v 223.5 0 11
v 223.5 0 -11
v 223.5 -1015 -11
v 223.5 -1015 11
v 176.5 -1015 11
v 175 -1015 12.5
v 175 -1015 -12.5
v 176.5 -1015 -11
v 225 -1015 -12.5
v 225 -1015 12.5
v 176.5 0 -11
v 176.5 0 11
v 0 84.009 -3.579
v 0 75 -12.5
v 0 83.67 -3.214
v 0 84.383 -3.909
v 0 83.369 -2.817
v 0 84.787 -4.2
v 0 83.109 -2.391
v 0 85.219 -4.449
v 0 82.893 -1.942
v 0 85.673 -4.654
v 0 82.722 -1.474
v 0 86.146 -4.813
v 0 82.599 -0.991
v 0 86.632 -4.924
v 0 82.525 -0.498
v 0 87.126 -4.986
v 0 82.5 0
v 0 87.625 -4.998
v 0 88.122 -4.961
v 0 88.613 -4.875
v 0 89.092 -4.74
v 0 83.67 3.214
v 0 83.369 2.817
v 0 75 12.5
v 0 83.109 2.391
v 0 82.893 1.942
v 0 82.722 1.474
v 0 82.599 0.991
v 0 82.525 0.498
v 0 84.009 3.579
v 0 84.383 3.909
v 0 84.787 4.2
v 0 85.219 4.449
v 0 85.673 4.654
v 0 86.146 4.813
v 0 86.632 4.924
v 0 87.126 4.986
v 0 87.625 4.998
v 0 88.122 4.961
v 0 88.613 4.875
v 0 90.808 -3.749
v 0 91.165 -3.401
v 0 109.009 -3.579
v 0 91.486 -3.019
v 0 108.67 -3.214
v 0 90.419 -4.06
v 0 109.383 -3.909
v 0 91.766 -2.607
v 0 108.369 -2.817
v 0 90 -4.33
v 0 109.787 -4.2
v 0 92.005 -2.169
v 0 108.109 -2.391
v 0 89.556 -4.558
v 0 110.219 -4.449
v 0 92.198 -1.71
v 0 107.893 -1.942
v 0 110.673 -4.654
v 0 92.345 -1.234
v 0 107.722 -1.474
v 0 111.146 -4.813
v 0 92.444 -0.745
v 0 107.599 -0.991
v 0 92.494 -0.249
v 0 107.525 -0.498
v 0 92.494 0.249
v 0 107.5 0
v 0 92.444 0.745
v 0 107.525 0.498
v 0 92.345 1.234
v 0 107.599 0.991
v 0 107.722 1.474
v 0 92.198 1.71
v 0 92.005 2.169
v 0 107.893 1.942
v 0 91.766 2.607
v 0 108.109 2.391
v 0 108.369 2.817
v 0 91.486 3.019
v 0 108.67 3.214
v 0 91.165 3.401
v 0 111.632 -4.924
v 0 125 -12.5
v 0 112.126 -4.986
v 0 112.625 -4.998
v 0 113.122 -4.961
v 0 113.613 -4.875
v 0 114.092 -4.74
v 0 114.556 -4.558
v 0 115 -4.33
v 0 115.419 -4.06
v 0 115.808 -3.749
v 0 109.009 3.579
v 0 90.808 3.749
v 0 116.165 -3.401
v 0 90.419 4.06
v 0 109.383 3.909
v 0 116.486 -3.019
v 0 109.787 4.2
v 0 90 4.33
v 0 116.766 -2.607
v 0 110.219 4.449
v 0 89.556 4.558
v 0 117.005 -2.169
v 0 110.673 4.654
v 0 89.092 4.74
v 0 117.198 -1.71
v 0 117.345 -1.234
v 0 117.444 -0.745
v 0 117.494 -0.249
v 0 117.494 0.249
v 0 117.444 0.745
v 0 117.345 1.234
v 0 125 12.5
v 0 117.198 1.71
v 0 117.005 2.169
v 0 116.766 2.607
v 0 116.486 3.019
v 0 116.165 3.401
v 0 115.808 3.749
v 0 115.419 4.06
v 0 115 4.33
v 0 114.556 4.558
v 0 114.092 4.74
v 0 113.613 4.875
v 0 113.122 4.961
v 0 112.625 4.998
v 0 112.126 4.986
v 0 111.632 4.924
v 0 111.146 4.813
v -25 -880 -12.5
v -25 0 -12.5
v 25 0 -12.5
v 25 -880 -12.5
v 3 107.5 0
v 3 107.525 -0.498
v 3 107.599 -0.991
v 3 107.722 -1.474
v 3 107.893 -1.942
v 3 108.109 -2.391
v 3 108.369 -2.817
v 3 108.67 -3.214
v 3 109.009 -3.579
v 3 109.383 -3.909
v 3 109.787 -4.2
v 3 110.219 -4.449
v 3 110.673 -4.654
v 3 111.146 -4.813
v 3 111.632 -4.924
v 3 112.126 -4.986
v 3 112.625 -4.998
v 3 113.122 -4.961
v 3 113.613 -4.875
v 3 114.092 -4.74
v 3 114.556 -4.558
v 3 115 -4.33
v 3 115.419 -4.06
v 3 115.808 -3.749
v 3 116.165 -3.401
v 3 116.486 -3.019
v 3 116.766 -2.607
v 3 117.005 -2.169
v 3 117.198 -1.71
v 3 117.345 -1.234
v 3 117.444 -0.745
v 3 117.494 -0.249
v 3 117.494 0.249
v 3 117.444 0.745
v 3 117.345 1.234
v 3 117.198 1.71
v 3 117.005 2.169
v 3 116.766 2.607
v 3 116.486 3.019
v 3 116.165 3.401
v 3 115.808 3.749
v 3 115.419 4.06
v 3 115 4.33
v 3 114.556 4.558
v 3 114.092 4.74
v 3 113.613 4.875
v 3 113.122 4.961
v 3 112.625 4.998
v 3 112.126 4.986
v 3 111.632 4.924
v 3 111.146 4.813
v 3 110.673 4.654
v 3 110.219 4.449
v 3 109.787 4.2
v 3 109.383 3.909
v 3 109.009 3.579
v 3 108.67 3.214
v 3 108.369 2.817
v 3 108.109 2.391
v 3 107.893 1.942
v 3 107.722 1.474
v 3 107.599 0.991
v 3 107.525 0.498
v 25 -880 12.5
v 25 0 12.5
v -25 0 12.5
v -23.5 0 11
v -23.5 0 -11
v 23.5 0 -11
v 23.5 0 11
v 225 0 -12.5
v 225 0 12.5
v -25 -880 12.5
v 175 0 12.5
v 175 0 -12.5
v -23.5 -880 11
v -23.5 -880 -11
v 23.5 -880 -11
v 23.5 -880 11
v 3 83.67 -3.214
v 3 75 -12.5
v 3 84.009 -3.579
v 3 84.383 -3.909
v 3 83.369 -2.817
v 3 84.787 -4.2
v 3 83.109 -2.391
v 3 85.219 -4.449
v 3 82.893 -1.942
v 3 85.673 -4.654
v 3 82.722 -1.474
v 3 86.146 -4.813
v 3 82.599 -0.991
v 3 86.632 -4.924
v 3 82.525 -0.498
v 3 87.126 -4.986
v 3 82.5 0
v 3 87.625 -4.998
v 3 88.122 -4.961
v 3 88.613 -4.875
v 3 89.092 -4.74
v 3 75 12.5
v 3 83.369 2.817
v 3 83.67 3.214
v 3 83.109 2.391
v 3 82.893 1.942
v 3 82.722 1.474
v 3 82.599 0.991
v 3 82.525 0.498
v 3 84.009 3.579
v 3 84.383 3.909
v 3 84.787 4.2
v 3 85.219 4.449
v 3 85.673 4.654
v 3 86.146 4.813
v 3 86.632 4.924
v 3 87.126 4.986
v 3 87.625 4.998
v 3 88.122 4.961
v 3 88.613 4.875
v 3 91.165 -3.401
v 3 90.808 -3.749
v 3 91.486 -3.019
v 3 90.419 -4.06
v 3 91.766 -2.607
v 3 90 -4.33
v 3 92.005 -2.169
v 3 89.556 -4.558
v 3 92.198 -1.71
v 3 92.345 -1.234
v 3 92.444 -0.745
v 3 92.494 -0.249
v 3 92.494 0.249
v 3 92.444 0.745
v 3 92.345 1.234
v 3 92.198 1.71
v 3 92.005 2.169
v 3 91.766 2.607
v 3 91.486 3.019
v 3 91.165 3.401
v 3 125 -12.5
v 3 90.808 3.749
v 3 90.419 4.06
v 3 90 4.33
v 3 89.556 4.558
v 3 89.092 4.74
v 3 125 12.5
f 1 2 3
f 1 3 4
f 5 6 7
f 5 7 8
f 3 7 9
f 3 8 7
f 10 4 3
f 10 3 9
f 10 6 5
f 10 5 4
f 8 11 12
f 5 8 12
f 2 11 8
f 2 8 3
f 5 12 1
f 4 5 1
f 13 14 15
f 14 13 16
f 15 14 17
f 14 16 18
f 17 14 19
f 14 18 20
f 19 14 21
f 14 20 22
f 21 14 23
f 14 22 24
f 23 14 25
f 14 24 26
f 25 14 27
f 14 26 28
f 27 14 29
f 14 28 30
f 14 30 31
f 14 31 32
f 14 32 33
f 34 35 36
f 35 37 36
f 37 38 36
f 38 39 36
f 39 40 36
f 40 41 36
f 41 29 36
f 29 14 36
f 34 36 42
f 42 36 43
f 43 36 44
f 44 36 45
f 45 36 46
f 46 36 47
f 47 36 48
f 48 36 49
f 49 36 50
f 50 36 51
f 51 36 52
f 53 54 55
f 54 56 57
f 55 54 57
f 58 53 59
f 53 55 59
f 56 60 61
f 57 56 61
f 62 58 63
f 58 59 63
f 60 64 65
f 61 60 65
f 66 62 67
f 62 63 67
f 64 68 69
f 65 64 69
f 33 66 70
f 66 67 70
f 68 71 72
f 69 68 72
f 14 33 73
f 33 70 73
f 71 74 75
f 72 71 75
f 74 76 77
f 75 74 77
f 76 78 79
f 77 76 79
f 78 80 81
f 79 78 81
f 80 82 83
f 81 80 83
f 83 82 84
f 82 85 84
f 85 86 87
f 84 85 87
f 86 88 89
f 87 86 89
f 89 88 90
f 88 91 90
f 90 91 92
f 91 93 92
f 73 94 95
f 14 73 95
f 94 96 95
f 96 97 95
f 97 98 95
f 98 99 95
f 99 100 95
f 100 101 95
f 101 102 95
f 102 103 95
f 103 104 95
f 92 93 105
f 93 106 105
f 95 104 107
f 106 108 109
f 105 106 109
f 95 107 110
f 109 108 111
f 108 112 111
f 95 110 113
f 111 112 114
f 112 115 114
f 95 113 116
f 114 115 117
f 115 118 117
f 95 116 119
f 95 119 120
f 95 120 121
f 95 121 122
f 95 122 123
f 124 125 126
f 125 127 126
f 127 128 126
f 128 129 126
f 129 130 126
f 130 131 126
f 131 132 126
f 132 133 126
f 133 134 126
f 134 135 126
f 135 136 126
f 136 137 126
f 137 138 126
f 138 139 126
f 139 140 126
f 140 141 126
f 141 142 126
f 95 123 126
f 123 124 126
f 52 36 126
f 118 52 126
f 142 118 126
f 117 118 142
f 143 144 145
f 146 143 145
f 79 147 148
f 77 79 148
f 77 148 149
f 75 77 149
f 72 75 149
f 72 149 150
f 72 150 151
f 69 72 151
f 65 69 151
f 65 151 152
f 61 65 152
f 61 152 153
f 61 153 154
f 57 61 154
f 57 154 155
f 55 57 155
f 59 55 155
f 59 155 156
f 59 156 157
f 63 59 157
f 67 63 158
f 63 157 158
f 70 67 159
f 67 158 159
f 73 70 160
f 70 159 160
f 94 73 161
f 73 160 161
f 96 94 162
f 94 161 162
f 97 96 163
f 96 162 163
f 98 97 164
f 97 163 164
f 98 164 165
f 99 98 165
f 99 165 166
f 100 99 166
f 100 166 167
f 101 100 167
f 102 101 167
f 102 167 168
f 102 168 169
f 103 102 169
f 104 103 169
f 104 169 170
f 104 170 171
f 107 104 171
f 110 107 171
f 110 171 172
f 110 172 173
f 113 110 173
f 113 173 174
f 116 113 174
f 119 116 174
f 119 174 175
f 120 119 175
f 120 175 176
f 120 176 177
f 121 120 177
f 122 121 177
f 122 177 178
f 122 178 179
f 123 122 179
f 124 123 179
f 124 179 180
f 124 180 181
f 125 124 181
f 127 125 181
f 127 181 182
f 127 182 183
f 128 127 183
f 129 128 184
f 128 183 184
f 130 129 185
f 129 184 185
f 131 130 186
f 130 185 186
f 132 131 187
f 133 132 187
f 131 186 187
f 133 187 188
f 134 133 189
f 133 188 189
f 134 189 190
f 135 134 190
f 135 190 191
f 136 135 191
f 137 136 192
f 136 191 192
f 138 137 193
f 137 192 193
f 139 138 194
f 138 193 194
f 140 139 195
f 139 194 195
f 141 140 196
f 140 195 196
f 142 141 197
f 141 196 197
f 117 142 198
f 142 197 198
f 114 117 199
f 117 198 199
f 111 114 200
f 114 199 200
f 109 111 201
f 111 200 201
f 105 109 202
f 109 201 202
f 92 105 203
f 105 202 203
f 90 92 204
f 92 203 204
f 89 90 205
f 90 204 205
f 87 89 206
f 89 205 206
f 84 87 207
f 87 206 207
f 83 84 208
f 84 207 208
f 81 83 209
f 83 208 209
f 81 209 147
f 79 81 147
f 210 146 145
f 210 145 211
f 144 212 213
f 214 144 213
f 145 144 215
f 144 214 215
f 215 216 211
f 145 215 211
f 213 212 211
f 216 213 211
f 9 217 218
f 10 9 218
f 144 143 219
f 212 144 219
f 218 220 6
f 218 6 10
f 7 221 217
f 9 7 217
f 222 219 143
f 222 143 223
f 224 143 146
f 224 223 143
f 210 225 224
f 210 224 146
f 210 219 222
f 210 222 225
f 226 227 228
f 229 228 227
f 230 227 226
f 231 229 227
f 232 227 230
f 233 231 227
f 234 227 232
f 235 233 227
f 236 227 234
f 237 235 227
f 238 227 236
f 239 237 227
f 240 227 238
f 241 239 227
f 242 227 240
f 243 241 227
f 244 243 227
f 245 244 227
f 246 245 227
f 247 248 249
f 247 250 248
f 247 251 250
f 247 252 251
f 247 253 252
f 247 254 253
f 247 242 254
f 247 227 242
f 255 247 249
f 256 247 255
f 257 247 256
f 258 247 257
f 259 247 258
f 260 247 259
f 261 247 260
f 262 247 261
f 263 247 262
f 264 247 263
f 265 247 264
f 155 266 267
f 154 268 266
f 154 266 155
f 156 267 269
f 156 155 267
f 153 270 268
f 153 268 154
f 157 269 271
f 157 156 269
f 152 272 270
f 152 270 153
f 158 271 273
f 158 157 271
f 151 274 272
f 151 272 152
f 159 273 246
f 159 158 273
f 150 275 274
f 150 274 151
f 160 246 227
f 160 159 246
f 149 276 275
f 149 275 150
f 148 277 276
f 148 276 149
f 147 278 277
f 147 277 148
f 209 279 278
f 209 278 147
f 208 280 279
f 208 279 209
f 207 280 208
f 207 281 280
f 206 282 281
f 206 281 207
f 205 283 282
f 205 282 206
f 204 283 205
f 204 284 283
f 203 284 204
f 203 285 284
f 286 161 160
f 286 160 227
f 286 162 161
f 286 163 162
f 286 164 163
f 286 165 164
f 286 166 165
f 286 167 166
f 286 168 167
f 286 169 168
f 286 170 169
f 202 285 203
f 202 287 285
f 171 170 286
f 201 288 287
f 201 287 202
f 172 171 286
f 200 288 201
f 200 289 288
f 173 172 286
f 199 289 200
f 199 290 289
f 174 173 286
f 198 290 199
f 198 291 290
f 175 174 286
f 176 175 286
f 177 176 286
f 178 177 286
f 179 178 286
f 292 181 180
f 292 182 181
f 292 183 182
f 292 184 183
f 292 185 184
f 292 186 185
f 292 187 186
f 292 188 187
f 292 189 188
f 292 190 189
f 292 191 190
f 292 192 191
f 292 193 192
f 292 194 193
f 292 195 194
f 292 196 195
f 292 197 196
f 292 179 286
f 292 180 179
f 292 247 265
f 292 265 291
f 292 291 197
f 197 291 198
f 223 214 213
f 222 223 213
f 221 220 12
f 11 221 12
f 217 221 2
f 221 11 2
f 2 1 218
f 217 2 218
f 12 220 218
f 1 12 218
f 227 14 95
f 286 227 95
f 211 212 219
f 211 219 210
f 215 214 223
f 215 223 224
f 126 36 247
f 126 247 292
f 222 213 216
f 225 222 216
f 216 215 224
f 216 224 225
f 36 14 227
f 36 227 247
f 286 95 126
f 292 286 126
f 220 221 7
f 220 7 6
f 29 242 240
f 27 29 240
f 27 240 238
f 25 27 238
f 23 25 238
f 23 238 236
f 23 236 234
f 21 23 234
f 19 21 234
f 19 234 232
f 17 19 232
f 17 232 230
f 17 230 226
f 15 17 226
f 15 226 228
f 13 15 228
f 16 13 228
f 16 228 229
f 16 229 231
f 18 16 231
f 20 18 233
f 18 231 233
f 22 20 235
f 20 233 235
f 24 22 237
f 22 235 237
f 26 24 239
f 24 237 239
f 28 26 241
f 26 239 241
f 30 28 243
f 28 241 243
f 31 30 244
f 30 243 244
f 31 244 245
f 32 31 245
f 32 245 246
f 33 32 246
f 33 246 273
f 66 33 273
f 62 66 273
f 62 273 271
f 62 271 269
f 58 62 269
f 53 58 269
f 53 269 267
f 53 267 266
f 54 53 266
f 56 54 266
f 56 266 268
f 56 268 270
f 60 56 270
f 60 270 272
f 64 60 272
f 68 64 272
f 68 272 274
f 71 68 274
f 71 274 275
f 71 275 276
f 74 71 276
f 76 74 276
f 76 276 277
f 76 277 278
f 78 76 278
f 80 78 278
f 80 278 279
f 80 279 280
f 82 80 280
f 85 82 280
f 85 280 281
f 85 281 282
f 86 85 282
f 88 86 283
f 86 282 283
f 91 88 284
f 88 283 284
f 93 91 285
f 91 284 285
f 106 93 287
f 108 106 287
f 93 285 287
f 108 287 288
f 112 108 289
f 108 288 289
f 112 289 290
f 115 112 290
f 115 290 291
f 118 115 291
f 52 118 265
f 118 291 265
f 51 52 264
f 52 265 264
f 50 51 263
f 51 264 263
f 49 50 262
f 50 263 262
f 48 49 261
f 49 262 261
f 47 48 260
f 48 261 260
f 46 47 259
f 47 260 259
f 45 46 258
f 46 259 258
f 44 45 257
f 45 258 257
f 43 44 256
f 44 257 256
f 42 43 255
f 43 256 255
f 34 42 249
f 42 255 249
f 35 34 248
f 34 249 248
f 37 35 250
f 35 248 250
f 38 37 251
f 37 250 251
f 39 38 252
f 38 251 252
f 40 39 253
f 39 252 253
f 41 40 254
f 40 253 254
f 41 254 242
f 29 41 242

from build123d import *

# Parameters (mm, degrees)
F0_W     = 50
F0_H     = 25
F0_W_2   = 47
F0_H_2   = 22
F1_DEPTH = 880
F2_W     = 50
F2_H     = 25
F3_DEPTH = 3
F4_D     = 10
F5_W     = 50
F5_H     = 25
F5_W_2   = 47
F5_H_2   = 22
F6_DEPTH = 1015


with BuildPart() as f1:
    # F0 (on Front) → F1 (new body)
    with BuildSketch(Plane.XZ):
        Rectangle(F0_W, F0_H)
        Rectangle(F0_W_2, F0_H_2, mode=Mode.SUBTRACT)
    extrude(amount=F1_DEPTH)


with BuildPart() as f3:
    # F2 (on Right) → F3 (new body)
    with BuildSketch(Plane.YZ):
        with Locations((100, 0)):
            Rectangle(F2_W, F2_H)
    extrude(amount=F3_DEPTH)

    # F4 (through all)
    with Locations(Plane(origin=(0, 0, 0), x_dir=(0, 1, 0), z_dir=(-1, 0, 0))):
        with Locations((87.5, 0), (112.5, 0)):
            Hole(F4_D / 2)


with BuildPart() as f6:
    # F5 (on Front) → F6 (new body)
    with BuildSketch(Plane.XZ):
        with Locations((200, 0)):
            Rectangle(F5_W, F5_H)
        with Locations((200, 0)):
            Rectangle(F5_W_2, F5_H_2, mode=Mode.SUBTRACT)
    extrude(amount=F6_DEPTH)


solid = Compound([f1.part, f3.part, f6.part])
